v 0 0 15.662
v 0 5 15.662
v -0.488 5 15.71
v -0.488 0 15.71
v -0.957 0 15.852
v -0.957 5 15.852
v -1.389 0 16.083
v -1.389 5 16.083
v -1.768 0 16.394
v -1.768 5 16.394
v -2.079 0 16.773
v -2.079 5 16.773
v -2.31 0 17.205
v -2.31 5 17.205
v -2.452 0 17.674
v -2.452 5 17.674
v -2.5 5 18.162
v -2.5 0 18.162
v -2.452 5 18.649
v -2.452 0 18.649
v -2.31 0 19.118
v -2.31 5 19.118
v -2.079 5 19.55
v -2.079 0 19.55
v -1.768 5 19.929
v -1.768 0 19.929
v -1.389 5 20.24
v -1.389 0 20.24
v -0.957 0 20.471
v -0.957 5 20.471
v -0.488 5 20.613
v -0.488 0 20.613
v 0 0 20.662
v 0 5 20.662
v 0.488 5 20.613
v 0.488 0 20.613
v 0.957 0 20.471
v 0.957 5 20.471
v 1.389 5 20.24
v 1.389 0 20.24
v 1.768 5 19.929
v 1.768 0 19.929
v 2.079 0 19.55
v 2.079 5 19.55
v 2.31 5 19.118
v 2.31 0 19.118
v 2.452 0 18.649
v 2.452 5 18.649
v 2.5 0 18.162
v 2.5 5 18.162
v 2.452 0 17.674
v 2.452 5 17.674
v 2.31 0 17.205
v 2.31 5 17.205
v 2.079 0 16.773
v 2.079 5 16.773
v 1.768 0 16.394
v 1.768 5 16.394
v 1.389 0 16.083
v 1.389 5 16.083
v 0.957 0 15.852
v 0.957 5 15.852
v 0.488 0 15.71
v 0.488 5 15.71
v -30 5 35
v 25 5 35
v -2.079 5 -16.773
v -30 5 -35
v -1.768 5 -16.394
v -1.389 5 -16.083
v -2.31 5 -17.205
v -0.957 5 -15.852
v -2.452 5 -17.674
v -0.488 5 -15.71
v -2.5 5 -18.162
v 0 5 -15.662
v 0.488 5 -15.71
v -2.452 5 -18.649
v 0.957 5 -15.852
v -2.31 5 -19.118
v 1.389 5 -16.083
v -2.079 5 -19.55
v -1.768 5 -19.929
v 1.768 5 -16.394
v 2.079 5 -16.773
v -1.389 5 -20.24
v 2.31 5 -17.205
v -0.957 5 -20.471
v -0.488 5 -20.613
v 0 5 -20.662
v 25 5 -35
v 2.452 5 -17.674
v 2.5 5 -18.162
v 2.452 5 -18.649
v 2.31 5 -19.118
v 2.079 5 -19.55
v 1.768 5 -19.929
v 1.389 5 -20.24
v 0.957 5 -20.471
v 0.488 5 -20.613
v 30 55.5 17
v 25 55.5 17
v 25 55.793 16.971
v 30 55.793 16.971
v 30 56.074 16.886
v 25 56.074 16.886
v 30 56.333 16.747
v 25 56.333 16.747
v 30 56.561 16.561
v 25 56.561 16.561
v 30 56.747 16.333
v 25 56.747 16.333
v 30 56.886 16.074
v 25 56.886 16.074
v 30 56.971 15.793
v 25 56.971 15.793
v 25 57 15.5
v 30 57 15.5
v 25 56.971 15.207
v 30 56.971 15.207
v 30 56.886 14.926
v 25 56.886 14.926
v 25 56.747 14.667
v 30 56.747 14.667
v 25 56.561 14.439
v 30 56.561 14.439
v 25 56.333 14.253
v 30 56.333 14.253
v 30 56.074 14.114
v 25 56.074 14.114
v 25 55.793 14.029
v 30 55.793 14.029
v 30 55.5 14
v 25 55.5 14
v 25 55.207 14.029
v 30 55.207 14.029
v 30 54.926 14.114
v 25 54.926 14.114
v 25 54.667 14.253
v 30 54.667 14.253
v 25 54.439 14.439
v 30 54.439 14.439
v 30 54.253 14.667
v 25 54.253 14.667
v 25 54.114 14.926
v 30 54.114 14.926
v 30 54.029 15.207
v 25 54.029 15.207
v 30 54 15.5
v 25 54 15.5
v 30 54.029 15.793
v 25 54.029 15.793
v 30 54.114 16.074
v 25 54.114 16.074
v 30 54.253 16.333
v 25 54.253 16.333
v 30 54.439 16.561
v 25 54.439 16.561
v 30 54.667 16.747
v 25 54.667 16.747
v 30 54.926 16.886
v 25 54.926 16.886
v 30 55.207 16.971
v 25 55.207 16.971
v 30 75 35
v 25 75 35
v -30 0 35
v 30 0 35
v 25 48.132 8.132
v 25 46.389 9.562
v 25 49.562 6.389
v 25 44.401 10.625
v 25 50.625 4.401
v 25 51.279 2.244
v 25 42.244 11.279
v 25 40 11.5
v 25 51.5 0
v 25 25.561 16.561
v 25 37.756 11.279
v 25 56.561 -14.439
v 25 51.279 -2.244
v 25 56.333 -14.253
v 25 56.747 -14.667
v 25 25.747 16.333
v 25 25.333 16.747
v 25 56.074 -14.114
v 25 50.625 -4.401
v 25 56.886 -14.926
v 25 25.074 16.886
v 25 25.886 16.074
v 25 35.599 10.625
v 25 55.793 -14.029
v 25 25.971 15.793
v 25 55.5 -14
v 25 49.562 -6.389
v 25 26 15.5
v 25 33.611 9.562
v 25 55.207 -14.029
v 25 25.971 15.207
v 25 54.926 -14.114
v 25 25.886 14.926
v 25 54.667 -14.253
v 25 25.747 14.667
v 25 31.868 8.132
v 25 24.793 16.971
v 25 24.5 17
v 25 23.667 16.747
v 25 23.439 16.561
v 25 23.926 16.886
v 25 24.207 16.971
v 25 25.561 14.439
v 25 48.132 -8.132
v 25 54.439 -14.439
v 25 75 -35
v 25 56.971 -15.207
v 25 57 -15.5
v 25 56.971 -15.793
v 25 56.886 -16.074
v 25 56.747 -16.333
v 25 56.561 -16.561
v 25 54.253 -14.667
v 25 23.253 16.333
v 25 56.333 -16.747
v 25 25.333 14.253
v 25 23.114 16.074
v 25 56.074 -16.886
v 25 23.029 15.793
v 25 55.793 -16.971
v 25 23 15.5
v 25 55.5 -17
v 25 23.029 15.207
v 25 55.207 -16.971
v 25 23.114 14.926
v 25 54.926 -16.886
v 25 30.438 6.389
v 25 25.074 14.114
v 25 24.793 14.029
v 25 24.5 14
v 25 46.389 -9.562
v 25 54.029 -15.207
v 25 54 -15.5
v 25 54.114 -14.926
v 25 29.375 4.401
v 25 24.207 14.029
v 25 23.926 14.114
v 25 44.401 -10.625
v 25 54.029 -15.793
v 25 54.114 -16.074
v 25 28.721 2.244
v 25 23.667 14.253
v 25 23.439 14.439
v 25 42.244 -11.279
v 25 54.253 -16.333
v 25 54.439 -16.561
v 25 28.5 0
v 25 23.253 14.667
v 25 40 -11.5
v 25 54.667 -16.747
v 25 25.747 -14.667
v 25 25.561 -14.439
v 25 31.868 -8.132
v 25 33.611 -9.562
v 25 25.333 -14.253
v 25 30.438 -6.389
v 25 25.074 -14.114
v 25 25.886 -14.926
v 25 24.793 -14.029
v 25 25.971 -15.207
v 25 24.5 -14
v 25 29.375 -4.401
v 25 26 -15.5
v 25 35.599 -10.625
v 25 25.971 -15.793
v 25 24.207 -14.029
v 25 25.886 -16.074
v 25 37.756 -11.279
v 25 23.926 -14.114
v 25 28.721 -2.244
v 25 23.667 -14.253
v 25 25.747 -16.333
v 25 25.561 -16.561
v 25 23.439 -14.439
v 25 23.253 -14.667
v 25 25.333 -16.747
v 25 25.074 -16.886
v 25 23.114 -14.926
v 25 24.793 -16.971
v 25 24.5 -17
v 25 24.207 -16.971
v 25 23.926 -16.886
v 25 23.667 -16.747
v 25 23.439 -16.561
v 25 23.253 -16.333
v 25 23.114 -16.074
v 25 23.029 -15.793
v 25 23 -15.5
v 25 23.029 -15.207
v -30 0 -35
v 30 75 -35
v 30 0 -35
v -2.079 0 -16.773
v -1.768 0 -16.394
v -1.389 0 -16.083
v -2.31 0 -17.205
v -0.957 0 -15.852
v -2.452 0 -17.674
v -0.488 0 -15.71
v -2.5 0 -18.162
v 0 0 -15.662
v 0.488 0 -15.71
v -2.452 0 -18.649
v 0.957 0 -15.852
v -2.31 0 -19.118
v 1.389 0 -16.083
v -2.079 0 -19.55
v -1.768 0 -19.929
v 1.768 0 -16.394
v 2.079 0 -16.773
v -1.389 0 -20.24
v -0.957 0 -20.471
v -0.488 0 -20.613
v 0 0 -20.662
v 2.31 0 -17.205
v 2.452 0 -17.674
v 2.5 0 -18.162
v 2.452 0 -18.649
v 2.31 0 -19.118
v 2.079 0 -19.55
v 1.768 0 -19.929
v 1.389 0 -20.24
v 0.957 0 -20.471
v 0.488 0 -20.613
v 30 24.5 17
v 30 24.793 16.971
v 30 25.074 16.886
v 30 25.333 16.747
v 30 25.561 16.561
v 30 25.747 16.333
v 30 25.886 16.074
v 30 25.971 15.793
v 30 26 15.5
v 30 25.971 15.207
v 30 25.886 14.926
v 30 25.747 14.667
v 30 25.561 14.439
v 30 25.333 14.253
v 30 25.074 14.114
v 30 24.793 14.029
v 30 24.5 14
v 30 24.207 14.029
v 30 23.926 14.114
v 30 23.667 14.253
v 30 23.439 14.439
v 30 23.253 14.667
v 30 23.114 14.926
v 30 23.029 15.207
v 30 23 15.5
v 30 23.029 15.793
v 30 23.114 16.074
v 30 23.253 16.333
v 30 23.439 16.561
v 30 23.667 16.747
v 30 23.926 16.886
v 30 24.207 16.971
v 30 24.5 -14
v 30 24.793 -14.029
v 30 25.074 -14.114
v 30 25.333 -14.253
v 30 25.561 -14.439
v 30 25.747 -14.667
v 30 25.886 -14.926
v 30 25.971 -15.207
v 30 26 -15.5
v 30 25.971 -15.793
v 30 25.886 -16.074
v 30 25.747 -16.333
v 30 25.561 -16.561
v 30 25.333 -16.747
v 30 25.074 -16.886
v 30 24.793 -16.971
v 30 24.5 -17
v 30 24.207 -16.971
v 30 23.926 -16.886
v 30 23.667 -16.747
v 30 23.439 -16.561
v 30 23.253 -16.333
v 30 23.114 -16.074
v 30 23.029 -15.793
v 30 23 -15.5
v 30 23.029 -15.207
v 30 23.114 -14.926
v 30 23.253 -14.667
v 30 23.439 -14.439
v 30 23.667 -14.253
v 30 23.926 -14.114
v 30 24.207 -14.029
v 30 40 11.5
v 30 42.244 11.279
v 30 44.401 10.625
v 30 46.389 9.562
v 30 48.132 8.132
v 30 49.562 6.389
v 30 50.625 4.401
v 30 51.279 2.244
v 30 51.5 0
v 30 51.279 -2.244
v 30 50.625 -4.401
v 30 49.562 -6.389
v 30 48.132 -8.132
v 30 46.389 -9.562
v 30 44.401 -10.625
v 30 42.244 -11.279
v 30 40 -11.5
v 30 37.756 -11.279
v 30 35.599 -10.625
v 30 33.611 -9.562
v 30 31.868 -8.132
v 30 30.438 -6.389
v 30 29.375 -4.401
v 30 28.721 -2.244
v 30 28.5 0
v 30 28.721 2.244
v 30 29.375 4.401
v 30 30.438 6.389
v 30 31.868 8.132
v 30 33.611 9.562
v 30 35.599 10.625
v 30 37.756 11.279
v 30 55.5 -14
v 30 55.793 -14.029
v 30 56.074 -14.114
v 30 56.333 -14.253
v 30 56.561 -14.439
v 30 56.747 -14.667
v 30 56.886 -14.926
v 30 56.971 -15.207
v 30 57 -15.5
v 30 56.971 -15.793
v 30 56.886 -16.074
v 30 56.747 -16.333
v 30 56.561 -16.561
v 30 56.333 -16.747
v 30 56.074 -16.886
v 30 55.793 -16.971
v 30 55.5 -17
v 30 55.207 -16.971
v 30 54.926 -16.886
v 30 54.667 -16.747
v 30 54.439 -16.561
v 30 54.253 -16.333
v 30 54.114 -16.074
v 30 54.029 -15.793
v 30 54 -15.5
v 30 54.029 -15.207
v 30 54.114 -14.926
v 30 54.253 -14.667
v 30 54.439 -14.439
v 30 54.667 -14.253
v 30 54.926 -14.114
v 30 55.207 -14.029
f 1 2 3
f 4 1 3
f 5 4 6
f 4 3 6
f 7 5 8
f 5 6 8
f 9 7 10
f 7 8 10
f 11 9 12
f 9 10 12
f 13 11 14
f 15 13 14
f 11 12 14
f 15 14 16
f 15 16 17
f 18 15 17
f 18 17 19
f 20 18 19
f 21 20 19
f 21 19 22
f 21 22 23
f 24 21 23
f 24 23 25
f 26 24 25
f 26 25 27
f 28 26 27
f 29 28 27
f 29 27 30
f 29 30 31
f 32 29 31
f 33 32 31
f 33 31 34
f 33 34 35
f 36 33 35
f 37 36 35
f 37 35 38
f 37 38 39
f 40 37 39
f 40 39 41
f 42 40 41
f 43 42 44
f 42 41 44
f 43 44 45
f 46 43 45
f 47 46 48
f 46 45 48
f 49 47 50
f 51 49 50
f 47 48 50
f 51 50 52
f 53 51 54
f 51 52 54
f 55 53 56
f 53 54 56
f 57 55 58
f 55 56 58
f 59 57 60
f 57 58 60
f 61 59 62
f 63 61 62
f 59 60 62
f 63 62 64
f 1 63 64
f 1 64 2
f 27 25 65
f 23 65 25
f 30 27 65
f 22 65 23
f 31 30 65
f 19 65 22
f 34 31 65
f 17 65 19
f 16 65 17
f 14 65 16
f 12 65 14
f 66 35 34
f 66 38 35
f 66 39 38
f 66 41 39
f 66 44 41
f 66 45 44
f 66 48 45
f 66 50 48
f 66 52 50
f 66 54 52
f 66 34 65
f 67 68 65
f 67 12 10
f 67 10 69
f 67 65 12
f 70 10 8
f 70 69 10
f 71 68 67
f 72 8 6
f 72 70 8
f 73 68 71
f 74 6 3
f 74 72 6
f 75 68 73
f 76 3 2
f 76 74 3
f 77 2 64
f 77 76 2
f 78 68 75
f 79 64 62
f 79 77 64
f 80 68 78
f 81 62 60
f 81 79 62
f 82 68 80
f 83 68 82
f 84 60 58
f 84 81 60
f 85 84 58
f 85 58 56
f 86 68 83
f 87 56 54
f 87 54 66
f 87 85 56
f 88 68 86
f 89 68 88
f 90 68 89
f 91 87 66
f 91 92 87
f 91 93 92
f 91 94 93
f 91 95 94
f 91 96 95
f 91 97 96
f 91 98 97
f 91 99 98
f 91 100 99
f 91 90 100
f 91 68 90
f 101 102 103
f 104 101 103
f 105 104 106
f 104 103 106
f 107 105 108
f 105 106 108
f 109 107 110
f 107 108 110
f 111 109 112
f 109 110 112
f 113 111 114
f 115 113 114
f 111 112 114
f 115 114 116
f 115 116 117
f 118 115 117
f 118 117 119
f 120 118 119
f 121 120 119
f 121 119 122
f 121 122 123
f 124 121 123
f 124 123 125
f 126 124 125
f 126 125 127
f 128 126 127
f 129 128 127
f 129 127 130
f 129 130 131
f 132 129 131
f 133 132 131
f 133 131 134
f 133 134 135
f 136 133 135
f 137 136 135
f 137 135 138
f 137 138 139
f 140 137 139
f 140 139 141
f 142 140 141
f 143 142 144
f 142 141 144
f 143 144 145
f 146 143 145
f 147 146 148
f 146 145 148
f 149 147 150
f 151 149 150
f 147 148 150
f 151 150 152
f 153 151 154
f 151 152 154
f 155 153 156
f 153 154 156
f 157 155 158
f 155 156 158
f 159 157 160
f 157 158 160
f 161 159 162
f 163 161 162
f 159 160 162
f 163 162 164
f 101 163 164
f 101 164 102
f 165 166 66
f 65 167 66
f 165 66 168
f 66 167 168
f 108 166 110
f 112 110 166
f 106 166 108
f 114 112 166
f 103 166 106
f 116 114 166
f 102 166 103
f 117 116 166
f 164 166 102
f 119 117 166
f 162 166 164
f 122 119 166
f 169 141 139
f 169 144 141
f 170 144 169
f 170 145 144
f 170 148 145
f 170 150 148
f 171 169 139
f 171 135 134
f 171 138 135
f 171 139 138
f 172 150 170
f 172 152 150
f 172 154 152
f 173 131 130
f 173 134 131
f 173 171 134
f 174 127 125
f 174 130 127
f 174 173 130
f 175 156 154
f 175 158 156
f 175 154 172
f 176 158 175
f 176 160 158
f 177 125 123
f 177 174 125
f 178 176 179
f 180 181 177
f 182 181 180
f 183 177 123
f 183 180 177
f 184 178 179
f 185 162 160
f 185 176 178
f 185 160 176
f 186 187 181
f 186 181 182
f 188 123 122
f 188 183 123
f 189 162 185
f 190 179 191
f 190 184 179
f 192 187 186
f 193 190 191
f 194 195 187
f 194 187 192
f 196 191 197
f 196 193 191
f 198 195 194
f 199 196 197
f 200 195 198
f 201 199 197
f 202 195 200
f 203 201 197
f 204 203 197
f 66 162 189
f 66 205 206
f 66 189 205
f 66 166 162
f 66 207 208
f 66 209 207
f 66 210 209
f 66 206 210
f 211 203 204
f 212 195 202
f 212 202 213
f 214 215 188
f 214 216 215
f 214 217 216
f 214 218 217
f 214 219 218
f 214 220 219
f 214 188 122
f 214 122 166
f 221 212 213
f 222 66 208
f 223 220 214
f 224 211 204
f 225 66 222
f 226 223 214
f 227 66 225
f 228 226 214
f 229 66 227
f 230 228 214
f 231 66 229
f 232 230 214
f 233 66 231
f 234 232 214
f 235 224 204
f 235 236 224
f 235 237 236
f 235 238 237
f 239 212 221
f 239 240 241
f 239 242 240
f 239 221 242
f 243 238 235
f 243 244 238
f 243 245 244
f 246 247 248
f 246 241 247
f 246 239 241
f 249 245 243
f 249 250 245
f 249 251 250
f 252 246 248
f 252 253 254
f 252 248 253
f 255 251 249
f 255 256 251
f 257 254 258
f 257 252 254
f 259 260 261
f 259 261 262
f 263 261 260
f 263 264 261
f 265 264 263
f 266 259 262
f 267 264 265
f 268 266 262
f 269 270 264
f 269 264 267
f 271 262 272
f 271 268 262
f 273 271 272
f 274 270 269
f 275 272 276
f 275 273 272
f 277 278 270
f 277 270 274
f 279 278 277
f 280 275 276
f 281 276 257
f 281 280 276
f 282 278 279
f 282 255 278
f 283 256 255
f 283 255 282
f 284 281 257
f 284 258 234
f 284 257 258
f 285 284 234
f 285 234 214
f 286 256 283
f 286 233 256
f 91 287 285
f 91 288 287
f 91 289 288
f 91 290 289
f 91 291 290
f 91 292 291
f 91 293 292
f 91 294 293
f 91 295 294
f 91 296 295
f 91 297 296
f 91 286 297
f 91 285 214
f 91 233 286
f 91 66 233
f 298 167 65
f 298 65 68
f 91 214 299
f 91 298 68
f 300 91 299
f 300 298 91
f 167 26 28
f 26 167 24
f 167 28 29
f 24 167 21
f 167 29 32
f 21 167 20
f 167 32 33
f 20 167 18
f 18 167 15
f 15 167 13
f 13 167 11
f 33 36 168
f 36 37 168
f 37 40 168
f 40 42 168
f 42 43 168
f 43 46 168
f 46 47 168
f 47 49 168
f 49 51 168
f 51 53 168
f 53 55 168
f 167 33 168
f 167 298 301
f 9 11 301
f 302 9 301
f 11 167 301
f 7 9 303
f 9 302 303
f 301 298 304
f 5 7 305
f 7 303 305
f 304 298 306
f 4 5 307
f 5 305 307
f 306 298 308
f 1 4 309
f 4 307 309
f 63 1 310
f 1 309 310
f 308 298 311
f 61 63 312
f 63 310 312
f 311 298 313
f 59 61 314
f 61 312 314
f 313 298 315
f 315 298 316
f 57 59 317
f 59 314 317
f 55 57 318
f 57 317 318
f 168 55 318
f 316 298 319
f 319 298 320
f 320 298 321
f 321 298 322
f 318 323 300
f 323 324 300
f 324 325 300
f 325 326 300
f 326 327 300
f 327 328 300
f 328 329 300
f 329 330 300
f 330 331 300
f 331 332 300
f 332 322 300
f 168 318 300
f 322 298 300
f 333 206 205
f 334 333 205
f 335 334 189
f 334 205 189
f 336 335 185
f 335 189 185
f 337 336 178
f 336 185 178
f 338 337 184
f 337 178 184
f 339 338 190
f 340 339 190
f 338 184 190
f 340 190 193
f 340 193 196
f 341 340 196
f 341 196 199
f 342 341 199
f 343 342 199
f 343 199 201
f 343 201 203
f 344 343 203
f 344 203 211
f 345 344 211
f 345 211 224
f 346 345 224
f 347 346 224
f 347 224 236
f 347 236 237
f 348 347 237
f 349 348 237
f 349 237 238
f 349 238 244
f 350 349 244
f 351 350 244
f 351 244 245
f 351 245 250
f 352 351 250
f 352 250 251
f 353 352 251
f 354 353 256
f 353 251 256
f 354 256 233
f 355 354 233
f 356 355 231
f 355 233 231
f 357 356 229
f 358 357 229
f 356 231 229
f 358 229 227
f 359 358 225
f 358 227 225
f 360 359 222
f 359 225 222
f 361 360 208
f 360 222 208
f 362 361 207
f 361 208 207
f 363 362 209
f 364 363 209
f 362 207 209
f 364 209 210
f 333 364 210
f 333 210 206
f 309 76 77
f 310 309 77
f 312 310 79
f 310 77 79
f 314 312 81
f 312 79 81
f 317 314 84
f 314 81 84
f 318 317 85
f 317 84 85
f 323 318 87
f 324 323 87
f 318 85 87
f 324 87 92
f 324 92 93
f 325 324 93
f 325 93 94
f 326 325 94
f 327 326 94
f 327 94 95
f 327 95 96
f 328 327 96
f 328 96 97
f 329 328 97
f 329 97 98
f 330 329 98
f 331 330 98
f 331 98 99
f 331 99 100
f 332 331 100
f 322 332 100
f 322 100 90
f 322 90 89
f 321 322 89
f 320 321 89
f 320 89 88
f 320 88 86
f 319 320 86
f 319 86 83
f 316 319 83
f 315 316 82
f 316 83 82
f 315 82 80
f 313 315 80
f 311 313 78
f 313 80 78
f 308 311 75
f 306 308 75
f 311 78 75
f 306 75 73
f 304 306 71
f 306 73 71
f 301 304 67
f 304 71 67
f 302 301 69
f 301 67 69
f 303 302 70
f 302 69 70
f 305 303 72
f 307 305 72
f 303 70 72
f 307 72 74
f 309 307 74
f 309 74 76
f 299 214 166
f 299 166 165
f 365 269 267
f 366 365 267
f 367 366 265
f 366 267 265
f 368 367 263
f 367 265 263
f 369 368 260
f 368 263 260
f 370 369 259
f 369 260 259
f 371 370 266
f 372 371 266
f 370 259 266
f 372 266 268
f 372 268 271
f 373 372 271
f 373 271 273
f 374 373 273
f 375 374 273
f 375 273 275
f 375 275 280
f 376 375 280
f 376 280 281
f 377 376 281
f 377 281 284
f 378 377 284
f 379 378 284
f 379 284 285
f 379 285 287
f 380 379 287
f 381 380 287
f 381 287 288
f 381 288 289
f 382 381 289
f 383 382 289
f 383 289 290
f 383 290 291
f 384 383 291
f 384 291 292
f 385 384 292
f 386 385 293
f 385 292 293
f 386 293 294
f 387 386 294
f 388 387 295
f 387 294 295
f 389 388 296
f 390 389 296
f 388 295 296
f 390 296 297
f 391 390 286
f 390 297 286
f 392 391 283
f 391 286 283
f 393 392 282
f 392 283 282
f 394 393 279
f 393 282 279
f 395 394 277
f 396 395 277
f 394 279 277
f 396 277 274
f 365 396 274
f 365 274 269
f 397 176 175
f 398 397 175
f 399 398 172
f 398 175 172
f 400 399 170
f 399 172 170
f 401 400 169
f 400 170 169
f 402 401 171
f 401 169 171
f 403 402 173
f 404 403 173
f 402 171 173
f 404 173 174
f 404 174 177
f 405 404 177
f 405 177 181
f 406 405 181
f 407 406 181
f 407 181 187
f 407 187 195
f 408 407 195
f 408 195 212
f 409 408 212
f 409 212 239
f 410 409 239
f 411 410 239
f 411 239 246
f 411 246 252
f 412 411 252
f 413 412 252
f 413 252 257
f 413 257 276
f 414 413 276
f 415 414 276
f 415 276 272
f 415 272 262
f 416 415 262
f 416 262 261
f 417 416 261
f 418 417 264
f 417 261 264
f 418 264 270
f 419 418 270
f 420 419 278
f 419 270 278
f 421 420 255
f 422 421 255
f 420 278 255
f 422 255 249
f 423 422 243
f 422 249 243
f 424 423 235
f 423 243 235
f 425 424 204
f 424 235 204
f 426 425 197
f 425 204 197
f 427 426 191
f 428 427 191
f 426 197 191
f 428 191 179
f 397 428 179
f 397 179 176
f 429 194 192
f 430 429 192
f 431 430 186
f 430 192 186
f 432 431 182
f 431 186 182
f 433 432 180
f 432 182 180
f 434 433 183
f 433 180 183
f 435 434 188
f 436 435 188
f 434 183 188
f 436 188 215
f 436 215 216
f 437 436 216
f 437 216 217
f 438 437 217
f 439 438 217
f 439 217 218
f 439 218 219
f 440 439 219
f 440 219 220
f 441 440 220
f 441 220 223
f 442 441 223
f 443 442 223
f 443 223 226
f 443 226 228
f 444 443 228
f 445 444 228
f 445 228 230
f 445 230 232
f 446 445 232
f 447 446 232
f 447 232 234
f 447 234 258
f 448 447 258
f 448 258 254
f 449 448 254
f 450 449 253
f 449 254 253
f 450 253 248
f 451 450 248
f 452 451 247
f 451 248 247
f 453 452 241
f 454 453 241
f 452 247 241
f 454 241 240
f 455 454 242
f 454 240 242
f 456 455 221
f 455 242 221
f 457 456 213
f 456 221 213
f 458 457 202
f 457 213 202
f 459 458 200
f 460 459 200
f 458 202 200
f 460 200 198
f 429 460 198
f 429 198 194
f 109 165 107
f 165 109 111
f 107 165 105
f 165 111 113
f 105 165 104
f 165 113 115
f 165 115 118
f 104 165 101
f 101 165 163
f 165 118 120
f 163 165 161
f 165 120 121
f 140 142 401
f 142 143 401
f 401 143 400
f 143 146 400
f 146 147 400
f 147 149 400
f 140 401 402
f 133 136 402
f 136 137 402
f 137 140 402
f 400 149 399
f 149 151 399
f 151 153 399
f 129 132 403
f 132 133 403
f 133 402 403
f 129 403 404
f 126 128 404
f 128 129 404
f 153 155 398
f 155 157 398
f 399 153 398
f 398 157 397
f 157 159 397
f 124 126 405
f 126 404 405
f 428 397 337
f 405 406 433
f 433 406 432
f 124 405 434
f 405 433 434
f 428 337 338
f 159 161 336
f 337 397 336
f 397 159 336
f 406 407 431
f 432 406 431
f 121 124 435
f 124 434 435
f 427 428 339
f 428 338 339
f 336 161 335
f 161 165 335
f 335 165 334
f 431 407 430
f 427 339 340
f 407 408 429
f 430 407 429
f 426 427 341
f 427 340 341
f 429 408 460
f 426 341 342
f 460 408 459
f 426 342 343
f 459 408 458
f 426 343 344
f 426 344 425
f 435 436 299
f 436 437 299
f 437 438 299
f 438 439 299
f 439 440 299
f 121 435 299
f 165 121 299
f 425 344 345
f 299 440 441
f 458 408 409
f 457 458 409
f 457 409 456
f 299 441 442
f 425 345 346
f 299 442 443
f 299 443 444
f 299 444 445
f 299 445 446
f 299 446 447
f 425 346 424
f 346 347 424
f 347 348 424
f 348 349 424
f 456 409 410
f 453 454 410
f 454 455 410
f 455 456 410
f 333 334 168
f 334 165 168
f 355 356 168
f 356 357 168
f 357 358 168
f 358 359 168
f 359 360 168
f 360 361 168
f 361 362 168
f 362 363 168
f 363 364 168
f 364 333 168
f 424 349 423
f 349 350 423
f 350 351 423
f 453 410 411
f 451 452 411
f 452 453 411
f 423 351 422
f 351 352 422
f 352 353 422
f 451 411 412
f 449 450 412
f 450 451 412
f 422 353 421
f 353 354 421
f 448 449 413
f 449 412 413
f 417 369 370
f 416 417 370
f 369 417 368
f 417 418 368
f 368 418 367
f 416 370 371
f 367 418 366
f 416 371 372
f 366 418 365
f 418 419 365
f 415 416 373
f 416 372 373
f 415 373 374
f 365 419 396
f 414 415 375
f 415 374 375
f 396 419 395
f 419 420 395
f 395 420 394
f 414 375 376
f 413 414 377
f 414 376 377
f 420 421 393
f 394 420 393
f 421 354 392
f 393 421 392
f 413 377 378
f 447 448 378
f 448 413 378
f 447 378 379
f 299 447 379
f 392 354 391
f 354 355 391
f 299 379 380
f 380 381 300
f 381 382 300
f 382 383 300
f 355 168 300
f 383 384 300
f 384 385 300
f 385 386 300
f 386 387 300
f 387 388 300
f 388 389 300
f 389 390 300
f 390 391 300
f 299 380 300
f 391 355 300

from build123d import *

# Parameters (mm, degrees)
SKETCH1_W           = 60
SKETCH1_H           = 70
BOSS_EXTRUDE1_DEPTH = 5
SKETCH2_W           = 5
SKETCH2_H           = 70
BOSS_EXTRUDE2_DEPTH = 70
SKETCH3_R           = 2.5
CUT_EXTRUDE1_DEPTH  = 70
SKETCH4_R           = 11.5
CUT_EXTRUDE2_DEPTH  = 10
SKETCH5_R           = 1.5
CUT_EXTRUDE3_DEPTH  = 10


with BuildPart() as part:
    # Sketch1 → Boss-Extrude1 (new body)
    with BuildSketch(Plane(origin=(0, 0, 0), x_dir=(1, 0, 0), z_dir=(0, 1, 0))):
        Rectangle(SKETCH1_W, SKETCH1_H)
    extrude(amount=BOSS_EXTRUDE1_DEPTH)

    # Sketch2 → Boss-Extrude2 (add)
    with BuildSketch(Plane(origin=(0, 5, 0), x_dir=(1, 0, 0), z_dir=(0, 1, 0))):
        with Locations((27.5, 0)):
            Rectangle(SKETCH2_W, SKETCH2_H)
    extrude(amount=BOSS_EXTRUDE2_DEPTH)

    # Sketch3 → Cut-Extrude1 (cut)
    with BuildSketch(Plane(origin=(0, 5, 0), x_dir=(1, 0, 0), z_dir=(0, 1, 0))):
        with Locations(Location((0, 18.161512971, 0), (0, 0, 270))):
            Circle(SKETCH3_R)
        with Locations(Location((0, -18.161512971, 0), (0, 0, 90))):
            Circle(SKETCH3_R)
    extrude(amount=-CUT_EXTRUDE1_DEPTH, mode=Mode.SUBTRACT)

    # Sketch4 → Cut-Extrude2 (cut)
    with BuildSketch(Plane.ZY.offset(-25)):
        with Locations((0, 40)):
            Circle(SKETCH4_R)
    extrude(amount=-CUT_EXTRUDE2_DEPTH, mode=Mode.SUBTRACT)

    # Sketch5 → Cut-Extrude3 (cut)
    with BuildSketch(Plane.ZY.offset(-25)):
        with Locations((-15.5, 55.5)):
            Circle(SKETCH5_R)
        with Locations((15.5, 55.5)):
            Circle(SKETCH5_R)
        with Locations((15.5, 24.5)):
            Circle(SKETCH5_R)
        with Locations((-15.5, 24.5)):
            Circle(SKETCH5_R)
    extrude(amount=-CUT_EXTRUDE3_DEPTH, mode=Mode.SUBTRACT)


solid = part.part
